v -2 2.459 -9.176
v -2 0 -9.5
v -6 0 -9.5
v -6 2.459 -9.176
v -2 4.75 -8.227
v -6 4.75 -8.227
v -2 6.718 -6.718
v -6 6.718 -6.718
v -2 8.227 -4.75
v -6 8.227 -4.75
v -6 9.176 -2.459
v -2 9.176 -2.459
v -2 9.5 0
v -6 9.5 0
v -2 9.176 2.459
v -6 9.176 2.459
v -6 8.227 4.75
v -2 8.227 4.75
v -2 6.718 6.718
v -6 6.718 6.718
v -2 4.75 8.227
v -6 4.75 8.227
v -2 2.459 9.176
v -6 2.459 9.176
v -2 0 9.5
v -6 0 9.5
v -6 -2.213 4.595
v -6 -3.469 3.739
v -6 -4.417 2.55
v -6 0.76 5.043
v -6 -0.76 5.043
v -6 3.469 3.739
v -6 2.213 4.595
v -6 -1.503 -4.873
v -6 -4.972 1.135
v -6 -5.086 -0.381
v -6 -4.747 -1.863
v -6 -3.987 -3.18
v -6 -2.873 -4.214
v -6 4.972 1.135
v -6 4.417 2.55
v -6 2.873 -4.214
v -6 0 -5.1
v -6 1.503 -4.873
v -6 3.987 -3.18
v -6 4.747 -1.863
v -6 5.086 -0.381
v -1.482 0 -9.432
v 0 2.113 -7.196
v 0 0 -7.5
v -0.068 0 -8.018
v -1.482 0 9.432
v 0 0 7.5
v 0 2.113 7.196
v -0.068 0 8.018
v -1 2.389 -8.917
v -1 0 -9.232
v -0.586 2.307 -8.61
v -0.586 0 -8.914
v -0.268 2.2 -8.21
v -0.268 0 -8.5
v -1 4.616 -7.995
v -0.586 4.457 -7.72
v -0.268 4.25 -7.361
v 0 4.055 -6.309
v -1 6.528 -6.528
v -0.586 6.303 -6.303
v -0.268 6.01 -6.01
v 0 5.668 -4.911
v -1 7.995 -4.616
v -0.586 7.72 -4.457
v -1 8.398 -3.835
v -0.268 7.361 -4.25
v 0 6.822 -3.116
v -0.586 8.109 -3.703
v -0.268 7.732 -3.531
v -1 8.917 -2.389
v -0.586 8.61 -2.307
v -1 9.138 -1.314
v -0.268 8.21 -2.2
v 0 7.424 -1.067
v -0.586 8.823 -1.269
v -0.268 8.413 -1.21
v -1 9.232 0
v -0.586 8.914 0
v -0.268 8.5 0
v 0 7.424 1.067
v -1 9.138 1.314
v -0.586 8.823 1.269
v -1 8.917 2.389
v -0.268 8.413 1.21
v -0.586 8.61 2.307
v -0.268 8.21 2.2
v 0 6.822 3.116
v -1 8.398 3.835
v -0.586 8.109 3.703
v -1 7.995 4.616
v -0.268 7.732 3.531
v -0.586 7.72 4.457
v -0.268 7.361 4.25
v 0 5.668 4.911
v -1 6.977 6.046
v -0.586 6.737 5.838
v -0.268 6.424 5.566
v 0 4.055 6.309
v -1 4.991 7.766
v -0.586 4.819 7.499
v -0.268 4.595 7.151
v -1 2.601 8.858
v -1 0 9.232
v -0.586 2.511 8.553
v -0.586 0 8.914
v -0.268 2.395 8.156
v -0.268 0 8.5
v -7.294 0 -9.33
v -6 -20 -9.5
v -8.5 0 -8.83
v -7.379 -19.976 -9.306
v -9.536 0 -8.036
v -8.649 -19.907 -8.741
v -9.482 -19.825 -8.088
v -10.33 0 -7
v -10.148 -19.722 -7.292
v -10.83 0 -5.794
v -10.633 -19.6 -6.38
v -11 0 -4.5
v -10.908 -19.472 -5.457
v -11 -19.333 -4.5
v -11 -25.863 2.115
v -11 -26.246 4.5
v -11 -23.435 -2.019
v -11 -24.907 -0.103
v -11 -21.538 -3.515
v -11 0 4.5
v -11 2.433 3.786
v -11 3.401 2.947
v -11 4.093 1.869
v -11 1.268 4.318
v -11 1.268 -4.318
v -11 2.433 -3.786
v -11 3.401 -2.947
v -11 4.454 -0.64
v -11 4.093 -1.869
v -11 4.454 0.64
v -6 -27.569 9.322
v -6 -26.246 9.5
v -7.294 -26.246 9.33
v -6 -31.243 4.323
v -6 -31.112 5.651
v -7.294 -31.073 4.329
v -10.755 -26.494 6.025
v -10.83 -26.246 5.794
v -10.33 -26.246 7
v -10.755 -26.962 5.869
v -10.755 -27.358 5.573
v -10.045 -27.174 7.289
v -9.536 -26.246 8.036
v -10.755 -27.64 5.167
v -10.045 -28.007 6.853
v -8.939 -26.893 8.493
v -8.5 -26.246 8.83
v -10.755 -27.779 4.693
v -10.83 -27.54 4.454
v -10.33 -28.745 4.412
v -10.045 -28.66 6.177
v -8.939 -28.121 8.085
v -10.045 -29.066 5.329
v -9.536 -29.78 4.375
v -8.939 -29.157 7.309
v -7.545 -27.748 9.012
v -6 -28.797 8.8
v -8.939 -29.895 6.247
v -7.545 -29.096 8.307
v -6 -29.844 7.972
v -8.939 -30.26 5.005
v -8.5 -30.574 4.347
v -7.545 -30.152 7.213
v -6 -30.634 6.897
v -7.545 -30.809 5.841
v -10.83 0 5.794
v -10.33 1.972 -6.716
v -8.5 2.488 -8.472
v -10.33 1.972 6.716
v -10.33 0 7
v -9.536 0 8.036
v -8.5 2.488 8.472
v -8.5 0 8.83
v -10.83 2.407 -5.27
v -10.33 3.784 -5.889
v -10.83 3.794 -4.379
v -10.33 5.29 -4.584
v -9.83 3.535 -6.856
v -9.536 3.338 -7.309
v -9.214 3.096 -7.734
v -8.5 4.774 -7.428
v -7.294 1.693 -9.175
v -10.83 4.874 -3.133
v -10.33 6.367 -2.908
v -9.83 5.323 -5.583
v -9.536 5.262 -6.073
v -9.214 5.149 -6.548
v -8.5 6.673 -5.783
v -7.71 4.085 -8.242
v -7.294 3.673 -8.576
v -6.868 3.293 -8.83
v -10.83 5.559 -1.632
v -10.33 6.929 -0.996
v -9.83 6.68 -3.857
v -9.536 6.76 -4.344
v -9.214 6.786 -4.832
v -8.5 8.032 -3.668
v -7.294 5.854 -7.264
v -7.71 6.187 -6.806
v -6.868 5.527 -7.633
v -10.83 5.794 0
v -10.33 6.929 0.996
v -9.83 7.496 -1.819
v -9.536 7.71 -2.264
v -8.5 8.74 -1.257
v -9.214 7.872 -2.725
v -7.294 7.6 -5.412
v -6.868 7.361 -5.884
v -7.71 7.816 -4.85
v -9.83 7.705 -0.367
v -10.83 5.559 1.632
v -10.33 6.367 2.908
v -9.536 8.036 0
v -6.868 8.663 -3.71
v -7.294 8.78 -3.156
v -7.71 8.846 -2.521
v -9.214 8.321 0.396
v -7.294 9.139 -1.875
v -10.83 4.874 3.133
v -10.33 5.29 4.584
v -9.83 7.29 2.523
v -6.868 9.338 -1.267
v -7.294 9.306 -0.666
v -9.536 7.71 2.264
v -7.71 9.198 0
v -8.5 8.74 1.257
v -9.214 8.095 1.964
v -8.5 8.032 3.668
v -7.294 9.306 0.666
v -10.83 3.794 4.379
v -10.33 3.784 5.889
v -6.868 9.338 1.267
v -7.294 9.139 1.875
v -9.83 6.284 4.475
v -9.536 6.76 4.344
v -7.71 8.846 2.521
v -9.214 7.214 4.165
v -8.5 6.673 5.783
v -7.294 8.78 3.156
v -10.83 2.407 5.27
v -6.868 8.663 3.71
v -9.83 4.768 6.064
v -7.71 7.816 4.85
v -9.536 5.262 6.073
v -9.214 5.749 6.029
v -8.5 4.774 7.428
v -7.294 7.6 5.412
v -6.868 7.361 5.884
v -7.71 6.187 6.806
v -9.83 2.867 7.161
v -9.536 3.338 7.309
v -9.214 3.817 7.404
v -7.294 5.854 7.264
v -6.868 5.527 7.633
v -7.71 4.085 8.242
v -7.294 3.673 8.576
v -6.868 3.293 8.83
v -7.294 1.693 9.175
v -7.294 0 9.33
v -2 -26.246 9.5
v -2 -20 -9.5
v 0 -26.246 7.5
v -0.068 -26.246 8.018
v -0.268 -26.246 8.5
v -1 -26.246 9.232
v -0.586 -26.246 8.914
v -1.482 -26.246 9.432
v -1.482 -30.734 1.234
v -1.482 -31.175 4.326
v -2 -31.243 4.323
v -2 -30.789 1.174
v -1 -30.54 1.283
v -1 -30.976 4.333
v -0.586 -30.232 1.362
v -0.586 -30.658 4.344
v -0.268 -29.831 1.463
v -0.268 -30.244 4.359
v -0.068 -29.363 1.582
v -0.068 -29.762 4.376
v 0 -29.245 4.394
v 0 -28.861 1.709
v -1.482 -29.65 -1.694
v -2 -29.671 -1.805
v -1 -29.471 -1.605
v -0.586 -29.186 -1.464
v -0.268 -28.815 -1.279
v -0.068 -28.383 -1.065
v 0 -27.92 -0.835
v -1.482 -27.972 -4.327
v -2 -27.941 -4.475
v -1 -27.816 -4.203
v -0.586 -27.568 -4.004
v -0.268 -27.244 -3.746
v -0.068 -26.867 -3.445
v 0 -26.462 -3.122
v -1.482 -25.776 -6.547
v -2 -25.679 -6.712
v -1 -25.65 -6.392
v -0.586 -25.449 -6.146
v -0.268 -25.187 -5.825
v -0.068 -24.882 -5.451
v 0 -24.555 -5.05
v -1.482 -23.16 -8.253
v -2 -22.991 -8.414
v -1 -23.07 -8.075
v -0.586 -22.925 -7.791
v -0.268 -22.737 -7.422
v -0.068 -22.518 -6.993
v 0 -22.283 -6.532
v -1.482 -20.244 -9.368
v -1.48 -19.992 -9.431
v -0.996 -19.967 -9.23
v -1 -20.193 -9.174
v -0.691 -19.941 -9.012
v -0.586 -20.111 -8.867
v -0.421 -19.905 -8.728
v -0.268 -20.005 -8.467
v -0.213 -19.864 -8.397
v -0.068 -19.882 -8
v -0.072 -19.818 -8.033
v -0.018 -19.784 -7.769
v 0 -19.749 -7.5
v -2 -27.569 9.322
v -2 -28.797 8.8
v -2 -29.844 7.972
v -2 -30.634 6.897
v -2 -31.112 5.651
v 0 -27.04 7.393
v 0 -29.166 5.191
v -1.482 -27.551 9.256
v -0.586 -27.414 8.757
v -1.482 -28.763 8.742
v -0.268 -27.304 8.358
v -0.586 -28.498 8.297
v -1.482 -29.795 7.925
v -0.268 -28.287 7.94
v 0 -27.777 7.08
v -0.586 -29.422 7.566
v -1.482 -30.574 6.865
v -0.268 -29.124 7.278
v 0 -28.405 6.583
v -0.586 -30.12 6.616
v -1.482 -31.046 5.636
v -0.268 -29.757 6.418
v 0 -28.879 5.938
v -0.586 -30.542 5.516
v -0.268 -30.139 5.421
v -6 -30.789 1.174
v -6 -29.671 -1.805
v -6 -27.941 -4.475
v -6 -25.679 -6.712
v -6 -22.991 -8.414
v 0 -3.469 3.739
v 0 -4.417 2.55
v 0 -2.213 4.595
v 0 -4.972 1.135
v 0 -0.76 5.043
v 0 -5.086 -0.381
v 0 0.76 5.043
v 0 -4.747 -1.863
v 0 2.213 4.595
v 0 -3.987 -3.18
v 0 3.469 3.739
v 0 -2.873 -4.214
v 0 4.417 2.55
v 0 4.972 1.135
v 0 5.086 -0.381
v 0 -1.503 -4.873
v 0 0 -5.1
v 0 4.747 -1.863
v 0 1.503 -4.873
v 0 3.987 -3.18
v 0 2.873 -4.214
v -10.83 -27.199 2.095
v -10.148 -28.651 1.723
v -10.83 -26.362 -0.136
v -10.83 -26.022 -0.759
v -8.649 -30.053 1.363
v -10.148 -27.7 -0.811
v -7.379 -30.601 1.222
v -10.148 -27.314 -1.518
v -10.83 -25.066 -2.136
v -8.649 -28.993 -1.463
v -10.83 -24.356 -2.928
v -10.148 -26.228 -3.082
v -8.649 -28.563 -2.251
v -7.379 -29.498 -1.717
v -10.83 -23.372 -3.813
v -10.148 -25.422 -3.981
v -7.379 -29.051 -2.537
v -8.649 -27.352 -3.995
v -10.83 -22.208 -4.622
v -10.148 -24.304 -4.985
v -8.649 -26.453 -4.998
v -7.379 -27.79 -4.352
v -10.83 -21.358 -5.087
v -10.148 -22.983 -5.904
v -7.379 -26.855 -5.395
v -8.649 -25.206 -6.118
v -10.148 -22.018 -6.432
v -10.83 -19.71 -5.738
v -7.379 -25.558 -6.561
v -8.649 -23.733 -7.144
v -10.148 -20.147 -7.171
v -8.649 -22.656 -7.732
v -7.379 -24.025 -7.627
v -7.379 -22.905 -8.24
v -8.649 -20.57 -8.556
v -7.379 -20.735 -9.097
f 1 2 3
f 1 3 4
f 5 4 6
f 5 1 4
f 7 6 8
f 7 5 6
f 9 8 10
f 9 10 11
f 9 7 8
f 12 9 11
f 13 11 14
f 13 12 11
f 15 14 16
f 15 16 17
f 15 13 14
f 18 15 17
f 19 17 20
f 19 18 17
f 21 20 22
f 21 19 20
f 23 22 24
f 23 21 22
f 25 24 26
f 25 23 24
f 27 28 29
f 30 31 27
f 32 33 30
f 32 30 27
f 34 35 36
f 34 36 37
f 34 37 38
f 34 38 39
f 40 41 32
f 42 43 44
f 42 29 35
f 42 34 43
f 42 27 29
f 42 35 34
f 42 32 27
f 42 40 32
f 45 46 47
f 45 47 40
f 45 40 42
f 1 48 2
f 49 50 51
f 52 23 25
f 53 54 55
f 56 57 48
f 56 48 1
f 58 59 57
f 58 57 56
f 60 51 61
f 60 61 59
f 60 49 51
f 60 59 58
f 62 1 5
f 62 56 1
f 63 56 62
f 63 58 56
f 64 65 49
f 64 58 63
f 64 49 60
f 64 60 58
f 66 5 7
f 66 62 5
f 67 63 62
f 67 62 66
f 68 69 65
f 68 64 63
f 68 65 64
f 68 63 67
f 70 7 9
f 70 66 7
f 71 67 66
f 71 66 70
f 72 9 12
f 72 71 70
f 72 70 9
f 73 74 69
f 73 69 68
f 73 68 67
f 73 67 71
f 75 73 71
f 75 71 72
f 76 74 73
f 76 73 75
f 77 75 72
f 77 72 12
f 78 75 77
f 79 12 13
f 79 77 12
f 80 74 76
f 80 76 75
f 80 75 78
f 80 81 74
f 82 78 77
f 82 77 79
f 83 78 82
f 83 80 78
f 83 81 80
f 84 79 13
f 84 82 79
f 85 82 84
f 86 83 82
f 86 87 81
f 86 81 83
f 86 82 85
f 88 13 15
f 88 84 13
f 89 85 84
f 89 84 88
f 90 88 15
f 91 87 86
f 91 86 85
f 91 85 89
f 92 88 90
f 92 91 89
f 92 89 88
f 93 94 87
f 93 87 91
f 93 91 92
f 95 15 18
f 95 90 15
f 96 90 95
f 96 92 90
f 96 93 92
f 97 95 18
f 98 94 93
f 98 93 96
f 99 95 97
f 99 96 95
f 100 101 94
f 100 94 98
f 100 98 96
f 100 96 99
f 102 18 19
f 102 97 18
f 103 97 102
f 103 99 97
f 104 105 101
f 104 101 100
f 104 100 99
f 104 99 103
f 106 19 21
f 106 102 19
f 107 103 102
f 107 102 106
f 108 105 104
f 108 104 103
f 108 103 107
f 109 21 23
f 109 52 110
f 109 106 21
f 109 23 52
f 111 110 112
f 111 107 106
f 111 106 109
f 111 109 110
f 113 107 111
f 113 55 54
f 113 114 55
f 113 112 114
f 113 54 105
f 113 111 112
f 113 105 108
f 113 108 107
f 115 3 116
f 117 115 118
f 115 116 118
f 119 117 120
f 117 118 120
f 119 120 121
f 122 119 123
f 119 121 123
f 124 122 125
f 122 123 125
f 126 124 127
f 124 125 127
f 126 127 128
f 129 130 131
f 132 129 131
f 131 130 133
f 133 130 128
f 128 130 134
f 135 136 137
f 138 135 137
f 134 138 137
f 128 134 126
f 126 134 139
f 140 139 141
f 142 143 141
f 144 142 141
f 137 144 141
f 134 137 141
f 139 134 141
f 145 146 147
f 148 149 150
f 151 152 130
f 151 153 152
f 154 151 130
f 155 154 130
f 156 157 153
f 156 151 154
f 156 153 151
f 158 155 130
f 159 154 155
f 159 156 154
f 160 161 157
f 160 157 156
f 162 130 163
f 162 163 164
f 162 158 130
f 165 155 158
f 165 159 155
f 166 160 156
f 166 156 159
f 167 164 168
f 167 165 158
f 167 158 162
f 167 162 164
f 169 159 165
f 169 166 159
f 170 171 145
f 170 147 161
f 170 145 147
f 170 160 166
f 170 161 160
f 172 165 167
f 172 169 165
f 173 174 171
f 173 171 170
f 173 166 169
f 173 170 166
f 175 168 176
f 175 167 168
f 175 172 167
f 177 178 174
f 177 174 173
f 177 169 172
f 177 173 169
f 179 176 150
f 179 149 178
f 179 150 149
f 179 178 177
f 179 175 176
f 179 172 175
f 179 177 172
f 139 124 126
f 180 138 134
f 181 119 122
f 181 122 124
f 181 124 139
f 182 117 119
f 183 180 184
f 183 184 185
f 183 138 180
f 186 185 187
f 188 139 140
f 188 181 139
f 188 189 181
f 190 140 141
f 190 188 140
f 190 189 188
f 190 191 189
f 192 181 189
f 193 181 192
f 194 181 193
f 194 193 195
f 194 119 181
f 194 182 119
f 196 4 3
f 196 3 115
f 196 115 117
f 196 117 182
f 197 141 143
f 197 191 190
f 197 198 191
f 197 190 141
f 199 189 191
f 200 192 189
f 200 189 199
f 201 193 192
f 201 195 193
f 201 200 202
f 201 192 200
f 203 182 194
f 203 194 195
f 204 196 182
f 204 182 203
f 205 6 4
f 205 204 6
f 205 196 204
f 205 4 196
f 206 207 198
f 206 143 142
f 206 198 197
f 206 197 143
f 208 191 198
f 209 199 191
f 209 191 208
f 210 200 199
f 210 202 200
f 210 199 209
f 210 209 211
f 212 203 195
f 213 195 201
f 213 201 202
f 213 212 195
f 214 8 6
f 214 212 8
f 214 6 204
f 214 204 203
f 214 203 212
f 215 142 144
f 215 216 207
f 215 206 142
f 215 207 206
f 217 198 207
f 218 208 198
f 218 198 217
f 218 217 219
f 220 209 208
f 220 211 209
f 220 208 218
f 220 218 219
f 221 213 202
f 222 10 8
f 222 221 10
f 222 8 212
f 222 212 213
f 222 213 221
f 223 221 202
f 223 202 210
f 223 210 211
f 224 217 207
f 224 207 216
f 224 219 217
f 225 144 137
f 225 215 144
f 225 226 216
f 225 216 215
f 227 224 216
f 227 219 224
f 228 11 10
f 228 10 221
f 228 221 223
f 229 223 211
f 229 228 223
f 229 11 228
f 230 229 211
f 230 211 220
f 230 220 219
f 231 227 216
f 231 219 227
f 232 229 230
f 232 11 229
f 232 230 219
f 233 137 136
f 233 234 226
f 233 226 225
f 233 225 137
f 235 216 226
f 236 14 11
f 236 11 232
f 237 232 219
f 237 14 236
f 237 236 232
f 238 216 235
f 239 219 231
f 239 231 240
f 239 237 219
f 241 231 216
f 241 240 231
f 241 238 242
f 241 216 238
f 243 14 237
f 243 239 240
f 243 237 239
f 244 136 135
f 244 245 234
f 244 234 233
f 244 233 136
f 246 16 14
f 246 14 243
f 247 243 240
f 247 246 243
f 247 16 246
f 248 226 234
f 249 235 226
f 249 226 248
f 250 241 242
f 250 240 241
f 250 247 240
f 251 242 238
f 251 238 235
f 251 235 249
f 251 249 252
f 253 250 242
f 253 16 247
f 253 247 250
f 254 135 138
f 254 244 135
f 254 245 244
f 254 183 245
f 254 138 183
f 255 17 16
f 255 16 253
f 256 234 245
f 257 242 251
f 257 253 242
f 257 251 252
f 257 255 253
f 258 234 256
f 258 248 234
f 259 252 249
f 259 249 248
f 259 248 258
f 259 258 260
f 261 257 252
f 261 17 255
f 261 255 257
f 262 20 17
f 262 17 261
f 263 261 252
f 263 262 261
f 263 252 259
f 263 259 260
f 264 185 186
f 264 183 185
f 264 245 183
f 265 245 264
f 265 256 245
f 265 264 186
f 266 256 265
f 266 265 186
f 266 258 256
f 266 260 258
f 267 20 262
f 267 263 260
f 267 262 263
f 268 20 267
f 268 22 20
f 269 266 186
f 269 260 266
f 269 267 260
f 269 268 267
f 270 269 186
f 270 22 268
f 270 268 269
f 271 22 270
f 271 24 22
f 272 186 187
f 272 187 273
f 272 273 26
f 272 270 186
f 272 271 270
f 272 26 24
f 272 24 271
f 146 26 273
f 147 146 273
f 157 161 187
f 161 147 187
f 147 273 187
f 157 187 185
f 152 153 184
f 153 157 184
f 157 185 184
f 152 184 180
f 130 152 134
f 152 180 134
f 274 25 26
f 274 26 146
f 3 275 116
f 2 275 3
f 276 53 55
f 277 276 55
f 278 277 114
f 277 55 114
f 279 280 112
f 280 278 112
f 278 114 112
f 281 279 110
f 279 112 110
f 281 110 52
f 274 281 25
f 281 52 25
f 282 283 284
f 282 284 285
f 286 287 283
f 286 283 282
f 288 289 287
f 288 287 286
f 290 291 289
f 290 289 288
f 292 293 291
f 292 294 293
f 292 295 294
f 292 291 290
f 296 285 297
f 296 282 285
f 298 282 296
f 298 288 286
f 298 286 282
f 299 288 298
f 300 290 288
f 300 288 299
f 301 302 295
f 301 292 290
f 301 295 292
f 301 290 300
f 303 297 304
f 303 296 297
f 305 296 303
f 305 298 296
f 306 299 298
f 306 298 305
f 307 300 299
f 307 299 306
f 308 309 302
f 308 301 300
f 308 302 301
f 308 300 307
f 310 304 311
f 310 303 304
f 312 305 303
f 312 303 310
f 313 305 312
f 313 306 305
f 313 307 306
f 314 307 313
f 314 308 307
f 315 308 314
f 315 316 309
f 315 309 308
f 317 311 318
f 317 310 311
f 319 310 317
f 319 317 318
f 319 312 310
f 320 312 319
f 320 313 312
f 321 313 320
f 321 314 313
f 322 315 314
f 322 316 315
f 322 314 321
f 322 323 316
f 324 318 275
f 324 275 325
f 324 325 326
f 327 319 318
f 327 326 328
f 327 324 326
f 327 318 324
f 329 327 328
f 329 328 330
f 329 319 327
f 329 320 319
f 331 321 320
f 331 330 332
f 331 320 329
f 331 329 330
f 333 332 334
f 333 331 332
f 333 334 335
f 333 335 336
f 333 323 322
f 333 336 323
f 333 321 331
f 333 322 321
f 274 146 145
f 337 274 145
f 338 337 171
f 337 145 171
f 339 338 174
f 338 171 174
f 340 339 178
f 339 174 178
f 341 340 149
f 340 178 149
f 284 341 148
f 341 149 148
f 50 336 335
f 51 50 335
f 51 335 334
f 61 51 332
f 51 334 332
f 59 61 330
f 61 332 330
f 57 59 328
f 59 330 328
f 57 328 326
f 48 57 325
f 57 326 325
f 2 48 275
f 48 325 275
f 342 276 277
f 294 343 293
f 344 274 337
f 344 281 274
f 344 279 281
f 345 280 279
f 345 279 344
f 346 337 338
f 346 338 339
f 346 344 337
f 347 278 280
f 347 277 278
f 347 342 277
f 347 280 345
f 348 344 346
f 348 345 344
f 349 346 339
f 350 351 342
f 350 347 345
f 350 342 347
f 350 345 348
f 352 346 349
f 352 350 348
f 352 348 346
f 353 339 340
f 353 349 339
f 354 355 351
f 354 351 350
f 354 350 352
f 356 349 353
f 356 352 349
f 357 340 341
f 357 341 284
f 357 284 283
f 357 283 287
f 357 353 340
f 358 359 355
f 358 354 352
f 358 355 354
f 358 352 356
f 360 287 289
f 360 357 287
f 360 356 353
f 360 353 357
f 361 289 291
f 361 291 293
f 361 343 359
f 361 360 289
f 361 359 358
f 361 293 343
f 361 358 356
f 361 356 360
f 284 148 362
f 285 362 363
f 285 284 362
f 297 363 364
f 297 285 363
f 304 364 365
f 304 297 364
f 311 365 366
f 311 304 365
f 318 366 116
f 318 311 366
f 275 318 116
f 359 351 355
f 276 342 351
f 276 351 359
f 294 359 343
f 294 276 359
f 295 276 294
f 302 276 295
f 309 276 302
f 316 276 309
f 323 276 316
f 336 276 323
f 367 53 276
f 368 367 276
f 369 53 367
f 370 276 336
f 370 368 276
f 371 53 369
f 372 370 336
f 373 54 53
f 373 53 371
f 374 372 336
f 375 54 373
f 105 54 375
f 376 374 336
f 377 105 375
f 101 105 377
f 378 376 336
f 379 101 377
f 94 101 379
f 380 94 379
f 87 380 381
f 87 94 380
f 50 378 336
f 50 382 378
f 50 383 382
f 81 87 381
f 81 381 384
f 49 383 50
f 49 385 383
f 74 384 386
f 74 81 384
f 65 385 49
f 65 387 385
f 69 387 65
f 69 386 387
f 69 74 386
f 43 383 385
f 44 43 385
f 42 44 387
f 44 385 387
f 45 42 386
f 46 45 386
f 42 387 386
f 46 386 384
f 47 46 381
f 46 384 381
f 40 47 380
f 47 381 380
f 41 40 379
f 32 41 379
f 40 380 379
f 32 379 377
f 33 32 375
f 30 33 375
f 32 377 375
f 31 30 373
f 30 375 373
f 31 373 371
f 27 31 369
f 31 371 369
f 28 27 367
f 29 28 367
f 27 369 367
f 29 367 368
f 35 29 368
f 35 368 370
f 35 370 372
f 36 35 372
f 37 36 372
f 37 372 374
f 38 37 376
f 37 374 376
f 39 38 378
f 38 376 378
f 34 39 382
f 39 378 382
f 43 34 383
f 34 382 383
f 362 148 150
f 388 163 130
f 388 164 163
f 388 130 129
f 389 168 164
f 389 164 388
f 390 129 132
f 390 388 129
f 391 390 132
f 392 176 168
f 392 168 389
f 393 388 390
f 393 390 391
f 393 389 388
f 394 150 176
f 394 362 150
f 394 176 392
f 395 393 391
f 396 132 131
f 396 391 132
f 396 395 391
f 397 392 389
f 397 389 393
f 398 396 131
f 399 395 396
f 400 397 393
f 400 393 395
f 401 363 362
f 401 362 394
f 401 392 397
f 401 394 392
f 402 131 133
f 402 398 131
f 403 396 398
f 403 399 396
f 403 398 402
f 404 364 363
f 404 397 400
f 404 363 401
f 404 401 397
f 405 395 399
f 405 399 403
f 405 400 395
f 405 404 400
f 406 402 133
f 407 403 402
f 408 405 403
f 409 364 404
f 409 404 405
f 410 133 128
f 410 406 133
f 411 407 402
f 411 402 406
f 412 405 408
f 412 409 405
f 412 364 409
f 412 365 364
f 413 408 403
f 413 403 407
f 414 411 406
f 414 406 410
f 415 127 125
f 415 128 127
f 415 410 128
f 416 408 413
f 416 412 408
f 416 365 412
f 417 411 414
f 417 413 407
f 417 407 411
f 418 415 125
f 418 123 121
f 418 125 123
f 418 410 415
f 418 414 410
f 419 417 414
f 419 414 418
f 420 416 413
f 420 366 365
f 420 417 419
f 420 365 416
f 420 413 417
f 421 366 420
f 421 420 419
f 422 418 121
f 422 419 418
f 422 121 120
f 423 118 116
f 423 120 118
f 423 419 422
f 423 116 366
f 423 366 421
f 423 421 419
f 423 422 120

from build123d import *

# Parameters (mm, degrees)
ESBO_O1_R                = 9.5
RESSALTO_EXTRUS_O1_DEPTH = 11
FILETE1_R                = 5
ESBO_O2_R                = 5.1000000000000005
CORTE_EXTRUS_O1_DEPTH    = 6
FILETE2_R                = 5
FILETE4_R                = 2


with BuildPart() as part:
    # Esboço1 → Ressalto-extrusão1 (new body)
    with BuildSketch(Plane(origin=(0, 0, 0), x_dir=(0, 0, -1), z_dir=(1, 0, 0))):
        Circle(ESBO_O1_R)
        with BuildLine():
            Line((9.500000000000002, -20), (9.5, 0))
            ThreePointArc((9.5, -2.33e-15), (-1.75e-15, -9.5), (-9.5, 1.16e-15))
            Line((-9.5, 0), (-9.5, -30.5))
            ThreePointArc((-9.5, -30.5), (2.298839010018332, -29.40980392289032), (9.5, -20))
        make_face()
    extrude(amount=-RESSALTO_EXTRUS_O1_DEPTH)

    # Filete1
    filete1_edges = [part.edges().sort_by_distance(p)[0] for p in [
        (-5.5, -30.5, 9.5),
    ]]
    fillet(filete1_edges, radius=FILETE1_R)

    # Esboço2 → Corte-extrusão1 (cut)
    with BuildSketch(Plane(origin=(0, 0, 0), x_dir=(0, 0, -1), z_dir=(1, 0, 0))):
        Circle(ESBO_O2_R)
    extrude(amount=-CORTE_EXTRUS_O1_DEPTH, mode=Mode.SUBTRACT)

    # Filete2
    # the kernel refuses this fillet: 5 mm, written as the material it takes off along each edge
    with BuildSketch(Plane(origin=(-11, -16.482034889709183, 4.845454403055449), x_dir=(0, -0.9993747520623889, -0.035356823107268454), z_dir=(0, -0.035356823107268454, 0.9993747520623889))) as filete2_piece_1:
        with BuildLine():
            CenterArc((14.770515920148714 - FILETE2_R, FILETE2_R), FILETE2_R, 270, 90)
            Line((14.770515920148714 - FILETE2_R, 0), (14.770515920148714 - FILETE2_R, -FILETE2_R * 0.02))
            Line((14.770515920148714 - FILETE2_R, -FILETE2_R * 0.02), (14.770515920148714 + FILETE2_R * 0.02, -FILETE2_R * 0.02))
            Line((14.770515920148714 + FILETE2_R * 0.02, -FILETE2_R * 0.02), (14.770515920148714 + FILETE2_R * 0.02, FILETE2_R))
            Line((14.770515920148714 + FILETE2_R * 0.02, FILETE2_R), (14.770515920148714, FILETE2_R))
        make_face()
    revolve(axis=Axis((-11, -16.482034889709183, 4.845454403055449), (1, 0, 0)), revolution_arc=93.59555420647537, mode=Mode.SUBTRACT)
    with BuildSketch(Plane(origin=(-11, -25, -9.500000000000002), x_dir=(1, 0, 0), z_dir=(0, 1, 9e-17))) as filete2_piece_2:
        with BuildLine():
            CenterArc((FILETE2_R, -FILETE2_R), FILETE2_R, 90, 90)
            Line((0, -FILETE2_R), (-FILETE2_R * 0.02, -FILETE2_R))
            Line((-FILETE2_R * 0.02, -FILETE2_R), (-FILETE2_R * 0.02, FILETE2_R * 0.02))
            Line((-FILETE2_R * 0.02, FILETE2_R * 0.02), (FILETE2_R, FILETE2_R * 0.02))
            Line((FILETE2_R, FILETE2_R * 0.02), (FILETE2_R, 0))
        make_face()
    extrude(amount=25, mode=Mode.SUBTRACT)
    with BuildSketch(Plane(origin=(-11, -26.246441814929426, 4.5), x_dir=(0, 0, 1), z_dir=(0, 1, 0))) as filete2_piece_3:
        with BuildLine():
            CenterArc((5 - FILETE2_R, FILETE2_R), FILETE2_R, 270, 90)
            Line((5 - FILETE2_R, 0), (5 - FILETE2_R, -FILETE2_R * 0.02))
            Line((5 - FILETE2_R, -FILETE2_R * 0.02), (5, -FILETE2_R * 0.02))
            Line((5, -FILETE2_R * 0.02), (5 + FILETE2_R * 0.02, 0))
            Line((5 + FILETE2_R * 0.02, 0), (5 + FILETE2_R * 0.02, FILETE2_R))
            Line((5 + FILETE2_R * 0.02, FILETE2_R), (5, FILETE2_R))
        make_face()
    revolve(axis=Axis((-11, -26.246441814929426, 4.5), (1, 0, 0)), revolution_arc=92.02621905507084, mode=Mode.SUBTRACT)
    with BuildSketch(Plane(origin=(-11, 0, 0), x_dir=(0, 0, -1), z_dir=(0, -1, 0))) as filete2_piece_4:
        with BuildLine():
            CenterArc((9.5 - FILETE2_R, FILETE2_R), FILETE2_R, 270, 90)
            Line((9.5 - FILETE2_R, 0), (9.5 - FILETE2_R, -FILETE2_R * 0.02))
            Line((9.5 - FILETE2_R, -FILETE2_R * 0.02), (9.5 + FILETE2_R * 0.02, -FILETE2_R * 0.02))
            Line((9.5 + FILETE2_R * 0.02, -FILETE2_R * 0.02), (9.5 + FILETE2_R * 0.02, FILETE2_R))
            Line((9.5 + FILETE2_R * 0.02, FILETE2_R), (9.5, FILETE2_R))
        make_face()
    revolve(axis=Axis((-11, 0, 0), (1, 0, 0)), revolution_arc=180, mode=Mode.SUBTRACT)
    with BuildSketch(Plane(origin=(-11, 0, 9.5), x_dir=(1, 0, 0), z_dir=(0, -1, 0))) as filete2_piece_5:
        with BuildLine():
            CenterArc((FILETE2_R, -FILETE2_R), FILETE2_R, 90, 90)
            Line((0, -FILETE2_R), (-FILETE2_R * 0.02, -FILETE2_R))
            Line((-FILETE2_R * 0.02, -FILETE2_R), (-FILETE2_R * 0.02, FILETE2_R * 0.02))
            Line((-FILETE2_R * 0.02, FILETE2_R * 0.02), (FILETE2_R, FILETE2_R * 0.02))
            Line((FILETE2_R, FILETE2_R * 0.02), (FILETE2_R, 0))
        make_face()
    extrude(amount=26.246441814929426, mode=Mode.SUBTRACT)

    # Filete4
    # the kernel refuses this fillet: 2 mm, written as the material it takes off along each edge
    with BuildSketch(Plane(origin=(0, -26.246441814929426, 4.5), x_dir=(0, 0, 1), z_dir=(0, 1, 0))) as filete4_piece_1:
        with BuildLine():
            CenterArc((5 - FILETE4_R, -FILETE4_R), FILETE4_R, 6.36e-15, 90)
            Line((5, -FILETE4_R), (5, 0))
            Line((5, 0), (5 - FILETE4_R, 0))
        make_face()
    revolve(axis=Axis((0, -26.246441814929426, 4.5), (1, 0, 0)), revolution_arc=92.02621905507084, mode=Mode.SUBTRACT)
    with BuildSketch(Plane(origin=(0, -25, -9.500000000000002), x_dir=(0, -9e-17, 1), z_dir=(0, 1, 9e-17))) as filete4_piece_2:
        with BuildLine():
            CenterArc((FILETE4_R, -FILETE4_R), FILETE4_R, 90, 90)
            Line((0, -FILETE4_R), (0, 0))
            Line((0, 0), (FILETE4_R, 0))
        make_face()
    extrude(amount=25, mode=Mode.SUBTRACT)
    with BuildSketch(Plane(origin=(0, -16.482034889709183, 4.845454403055449), x_dir=(0, -0.9993747520623889, -0.035356823107268454), z_dir=(0, -0.035356823107268454, 0.9993747520623889))) as filete4_piece_3:
        with BuildLine():
            CenterArc((14.770515920148714 - FILETE4_R, -FILETE4_R), FILETE4_R, 6.36e-15, 90)
            Line((14.770515920148714, -FILETE4_R), (14.770515920148714, 0))
            Line((14.770515920148714, 0), (14.770515920148714 - FILETE4_R, 0))
        make_face()
    revolve(axis=Axis((0, -16.482034889709183, 4.845454403055449), (1, 0, 0)), revolution_arc=93.59555420647538, mode=Mode.SUBTRACT)
    with BuildSketch(Plane(origin=(0, 0, 9.5), x_dir=(0, 0, -1), z_dir=(0, -1, 0))) as filete4_piece_4:
        with BuildLine():
            CenterArc((FILETE4_R, -FILETE4_R), FILETE4_R, 90, 90)
            Line((0, -FILETE4_R), (0, 0))
            Line((0, 0), (FILETE4_R, 0))
        make_face()
    extrude(amount=26.246441814929426, mode=Mode.SUBTRACT)
    with BuildSketch(Plane(origin=(0, 0, 0), x_dir=(0, 0, -1), z_dir=(0, -1, 0))) as filete4_piece_5:
        with BuildLine():
            CenterArc((9.5 - FILETE4_R, -FILETE4_R), FILETE4_R, 6.36e-15, 90)
            Line((9.5, -FILETE4_R), (9.5, 0))
            Line((9.5, 0), (9.5 - FILETE4_R, 0))
        make_face()
    revolve(axis=Axis((0, 0, 0), (1, 0, 0)), revolution_arc=180, mode=Mode.SUBTRACT)


solid = part.part
